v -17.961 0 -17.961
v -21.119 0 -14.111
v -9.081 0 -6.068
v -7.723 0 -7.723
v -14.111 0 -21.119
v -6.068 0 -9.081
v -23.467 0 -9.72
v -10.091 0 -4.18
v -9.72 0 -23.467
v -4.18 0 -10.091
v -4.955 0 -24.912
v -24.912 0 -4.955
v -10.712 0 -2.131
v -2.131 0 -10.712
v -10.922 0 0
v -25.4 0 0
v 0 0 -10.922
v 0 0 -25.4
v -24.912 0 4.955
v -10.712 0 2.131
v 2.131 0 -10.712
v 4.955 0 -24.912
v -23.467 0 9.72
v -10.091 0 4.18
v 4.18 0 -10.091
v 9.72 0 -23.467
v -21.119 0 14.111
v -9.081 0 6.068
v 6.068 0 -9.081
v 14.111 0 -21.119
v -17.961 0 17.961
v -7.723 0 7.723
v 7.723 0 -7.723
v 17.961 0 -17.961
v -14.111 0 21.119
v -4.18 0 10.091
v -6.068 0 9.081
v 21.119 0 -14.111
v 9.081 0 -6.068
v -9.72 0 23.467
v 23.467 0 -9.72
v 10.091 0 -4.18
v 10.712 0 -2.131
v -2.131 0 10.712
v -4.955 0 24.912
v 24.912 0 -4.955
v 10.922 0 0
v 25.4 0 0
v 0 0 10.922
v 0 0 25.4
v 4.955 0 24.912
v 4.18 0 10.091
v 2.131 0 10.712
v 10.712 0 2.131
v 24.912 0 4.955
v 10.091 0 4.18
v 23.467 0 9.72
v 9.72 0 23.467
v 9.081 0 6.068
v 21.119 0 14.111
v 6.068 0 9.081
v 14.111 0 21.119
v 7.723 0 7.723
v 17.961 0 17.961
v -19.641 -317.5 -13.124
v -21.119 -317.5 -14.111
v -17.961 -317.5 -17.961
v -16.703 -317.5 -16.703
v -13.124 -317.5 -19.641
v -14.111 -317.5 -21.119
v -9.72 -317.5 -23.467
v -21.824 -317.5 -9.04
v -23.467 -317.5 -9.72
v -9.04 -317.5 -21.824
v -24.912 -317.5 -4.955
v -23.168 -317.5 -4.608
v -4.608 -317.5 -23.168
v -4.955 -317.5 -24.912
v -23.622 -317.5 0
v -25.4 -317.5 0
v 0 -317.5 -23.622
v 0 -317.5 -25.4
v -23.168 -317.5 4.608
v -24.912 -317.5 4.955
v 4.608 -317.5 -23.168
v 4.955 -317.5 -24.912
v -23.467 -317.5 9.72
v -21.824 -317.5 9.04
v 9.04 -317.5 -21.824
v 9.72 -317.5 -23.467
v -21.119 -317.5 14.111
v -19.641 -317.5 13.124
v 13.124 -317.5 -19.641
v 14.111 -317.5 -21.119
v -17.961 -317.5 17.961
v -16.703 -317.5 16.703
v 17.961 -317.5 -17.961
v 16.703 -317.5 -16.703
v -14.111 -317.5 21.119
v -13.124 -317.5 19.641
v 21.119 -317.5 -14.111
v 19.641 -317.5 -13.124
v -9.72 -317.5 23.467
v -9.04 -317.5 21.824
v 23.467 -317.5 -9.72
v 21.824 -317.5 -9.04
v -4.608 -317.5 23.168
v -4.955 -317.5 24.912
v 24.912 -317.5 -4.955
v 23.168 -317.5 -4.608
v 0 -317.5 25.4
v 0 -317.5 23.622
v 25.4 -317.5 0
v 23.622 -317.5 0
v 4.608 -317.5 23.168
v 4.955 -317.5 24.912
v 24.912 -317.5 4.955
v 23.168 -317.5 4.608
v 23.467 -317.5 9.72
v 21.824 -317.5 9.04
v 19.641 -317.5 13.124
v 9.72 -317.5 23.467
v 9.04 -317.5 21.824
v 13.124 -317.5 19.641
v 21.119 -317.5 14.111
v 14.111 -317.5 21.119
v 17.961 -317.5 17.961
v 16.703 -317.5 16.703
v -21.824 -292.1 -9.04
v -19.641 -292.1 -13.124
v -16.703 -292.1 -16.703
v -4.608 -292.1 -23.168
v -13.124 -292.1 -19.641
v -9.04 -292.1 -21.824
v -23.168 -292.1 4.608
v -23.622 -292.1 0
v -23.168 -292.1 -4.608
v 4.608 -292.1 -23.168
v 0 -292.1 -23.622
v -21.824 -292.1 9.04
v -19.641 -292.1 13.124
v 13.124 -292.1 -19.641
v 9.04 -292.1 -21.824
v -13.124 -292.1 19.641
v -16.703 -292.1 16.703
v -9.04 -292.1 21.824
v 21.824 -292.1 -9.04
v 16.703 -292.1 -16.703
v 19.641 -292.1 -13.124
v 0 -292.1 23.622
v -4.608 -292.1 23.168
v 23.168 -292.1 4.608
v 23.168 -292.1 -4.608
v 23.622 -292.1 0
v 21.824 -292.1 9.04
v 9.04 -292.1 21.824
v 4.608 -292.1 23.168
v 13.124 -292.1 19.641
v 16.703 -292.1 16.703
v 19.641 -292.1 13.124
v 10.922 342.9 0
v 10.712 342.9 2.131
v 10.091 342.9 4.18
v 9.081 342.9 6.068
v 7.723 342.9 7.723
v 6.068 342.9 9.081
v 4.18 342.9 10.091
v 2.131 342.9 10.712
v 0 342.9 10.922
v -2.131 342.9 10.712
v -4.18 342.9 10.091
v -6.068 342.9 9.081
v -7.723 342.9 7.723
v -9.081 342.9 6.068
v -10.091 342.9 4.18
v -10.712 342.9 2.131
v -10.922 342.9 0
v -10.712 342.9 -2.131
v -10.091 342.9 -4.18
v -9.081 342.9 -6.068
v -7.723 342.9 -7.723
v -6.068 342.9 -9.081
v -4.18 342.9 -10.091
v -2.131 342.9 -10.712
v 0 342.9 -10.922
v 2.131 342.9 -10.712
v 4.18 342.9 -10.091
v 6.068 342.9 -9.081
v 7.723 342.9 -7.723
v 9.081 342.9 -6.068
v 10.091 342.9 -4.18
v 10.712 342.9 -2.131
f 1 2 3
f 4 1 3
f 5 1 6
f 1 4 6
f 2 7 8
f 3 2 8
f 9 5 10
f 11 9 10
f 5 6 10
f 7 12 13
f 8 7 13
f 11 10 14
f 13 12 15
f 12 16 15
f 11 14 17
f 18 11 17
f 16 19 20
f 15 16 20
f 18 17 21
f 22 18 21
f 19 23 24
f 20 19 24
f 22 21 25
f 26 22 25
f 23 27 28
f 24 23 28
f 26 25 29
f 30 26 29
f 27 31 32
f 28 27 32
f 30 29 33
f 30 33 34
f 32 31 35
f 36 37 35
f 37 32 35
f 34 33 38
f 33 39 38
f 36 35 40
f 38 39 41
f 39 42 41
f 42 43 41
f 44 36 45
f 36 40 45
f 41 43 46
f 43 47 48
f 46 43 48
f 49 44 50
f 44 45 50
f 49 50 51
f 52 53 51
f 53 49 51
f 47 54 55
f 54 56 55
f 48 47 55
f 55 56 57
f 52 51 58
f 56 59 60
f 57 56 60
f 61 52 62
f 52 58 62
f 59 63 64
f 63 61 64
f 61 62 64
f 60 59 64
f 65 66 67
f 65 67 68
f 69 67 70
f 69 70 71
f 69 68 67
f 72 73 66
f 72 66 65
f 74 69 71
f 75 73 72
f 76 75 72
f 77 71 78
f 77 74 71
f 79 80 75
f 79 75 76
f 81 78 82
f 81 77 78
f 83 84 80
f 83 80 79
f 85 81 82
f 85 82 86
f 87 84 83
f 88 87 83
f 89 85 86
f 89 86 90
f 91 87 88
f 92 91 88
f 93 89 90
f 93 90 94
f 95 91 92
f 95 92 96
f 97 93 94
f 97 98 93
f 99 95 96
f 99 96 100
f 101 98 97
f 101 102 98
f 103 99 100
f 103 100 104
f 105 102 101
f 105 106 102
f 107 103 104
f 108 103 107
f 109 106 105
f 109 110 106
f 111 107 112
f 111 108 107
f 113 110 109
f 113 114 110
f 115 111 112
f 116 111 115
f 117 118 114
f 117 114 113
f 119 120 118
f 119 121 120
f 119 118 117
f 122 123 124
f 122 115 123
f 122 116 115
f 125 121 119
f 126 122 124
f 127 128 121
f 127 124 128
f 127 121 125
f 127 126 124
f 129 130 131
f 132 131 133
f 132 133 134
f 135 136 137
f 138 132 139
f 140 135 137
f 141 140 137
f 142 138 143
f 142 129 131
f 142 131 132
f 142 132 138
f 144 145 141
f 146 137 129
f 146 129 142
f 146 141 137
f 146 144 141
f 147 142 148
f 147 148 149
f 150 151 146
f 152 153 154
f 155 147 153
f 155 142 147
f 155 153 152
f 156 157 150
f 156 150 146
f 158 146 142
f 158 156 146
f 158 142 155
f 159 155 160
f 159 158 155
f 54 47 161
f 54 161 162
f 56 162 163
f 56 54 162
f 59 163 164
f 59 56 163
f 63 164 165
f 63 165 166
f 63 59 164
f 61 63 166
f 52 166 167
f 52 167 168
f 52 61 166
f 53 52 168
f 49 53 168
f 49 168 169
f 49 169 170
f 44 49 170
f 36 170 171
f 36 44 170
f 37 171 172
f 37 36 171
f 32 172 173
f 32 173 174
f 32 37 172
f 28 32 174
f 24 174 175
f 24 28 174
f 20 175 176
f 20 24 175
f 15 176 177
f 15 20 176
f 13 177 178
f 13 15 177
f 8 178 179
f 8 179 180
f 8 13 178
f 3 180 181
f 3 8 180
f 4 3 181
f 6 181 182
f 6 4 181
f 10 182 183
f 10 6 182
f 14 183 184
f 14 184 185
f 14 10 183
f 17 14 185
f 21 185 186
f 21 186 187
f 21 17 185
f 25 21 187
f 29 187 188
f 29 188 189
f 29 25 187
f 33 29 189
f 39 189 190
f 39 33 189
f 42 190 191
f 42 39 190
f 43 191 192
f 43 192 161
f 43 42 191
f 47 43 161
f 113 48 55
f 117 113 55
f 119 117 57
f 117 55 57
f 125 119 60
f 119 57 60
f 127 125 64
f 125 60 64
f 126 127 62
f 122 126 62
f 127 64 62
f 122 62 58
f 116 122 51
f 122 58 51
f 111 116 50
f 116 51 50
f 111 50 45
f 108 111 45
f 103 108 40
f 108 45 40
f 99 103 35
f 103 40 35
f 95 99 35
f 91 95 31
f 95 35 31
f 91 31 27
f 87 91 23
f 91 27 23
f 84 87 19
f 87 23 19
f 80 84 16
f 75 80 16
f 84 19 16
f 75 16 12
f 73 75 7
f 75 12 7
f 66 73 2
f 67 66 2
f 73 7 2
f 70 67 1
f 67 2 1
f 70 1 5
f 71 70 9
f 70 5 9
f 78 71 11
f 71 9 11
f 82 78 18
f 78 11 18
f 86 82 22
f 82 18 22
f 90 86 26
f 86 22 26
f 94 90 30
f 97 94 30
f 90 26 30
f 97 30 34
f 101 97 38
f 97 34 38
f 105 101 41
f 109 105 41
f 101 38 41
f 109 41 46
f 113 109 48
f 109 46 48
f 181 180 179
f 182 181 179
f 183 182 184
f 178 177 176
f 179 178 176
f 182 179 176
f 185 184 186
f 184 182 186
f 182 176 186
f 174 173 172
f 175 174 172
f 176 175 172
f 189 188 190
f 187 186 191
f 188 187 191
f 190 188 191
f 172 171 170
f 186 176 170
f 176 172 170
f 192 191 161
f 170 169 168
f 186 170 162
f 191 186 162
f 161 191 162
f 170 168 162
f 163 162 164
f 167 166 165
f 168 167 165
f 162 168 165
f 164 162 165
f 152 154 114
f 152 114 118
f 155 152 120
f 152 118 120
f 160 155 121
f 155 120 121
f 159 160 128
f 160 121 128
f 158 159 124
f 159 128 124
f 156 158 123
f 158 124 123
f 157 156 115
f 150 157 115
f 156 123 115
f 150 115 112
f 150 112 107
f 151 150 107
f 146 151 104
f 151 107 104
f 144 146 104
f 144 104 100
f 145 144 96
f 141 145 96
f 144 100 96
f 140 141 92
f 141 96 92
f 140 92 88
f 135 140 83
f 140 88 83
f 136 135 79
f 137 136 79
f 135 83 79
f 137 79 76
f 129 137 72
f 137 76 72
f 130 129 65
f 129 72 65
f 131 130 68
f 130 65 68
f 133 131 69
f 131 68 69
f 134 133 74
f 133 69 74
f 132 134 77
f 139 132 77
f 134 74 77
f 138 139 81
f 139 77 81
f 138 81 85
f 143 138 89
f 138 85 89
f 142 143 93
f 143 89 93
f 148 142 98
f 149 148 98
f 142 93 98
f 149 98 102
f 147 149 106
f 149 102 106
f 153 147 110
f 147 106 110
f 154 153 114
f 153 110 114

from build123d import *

# Parameters (mm, degrees)
F0_R     = 25.4
F1_DEPTH = 317.5
F2_R     = 23.622
F3_DEPTH = 25.4
F4_R     = 10.922
F5_DEPTH = 342.9


with BuildPart() as f1:
    # F0 (on Front) → F1 (new body)
    with BuildSketch(Plane.XZ):
        Circle(F0_R)
    extrude(amount=F1_DEPTH)

    # F2 (on face) → F3 (cut)
    with BuildSketch(Plane.XZ.offset(317.5)):
        Circle(F2_R)
    extrude(amount=-F3_DEPTH, mode=Mode.SUBTRACT)

    # F4 (on Front) → F5 (join)
    with BuildSketch(Plane.XZ):
        Circle(F4_R)
    extrude(amount=-F5_DEPTH)


solid = f1.part
